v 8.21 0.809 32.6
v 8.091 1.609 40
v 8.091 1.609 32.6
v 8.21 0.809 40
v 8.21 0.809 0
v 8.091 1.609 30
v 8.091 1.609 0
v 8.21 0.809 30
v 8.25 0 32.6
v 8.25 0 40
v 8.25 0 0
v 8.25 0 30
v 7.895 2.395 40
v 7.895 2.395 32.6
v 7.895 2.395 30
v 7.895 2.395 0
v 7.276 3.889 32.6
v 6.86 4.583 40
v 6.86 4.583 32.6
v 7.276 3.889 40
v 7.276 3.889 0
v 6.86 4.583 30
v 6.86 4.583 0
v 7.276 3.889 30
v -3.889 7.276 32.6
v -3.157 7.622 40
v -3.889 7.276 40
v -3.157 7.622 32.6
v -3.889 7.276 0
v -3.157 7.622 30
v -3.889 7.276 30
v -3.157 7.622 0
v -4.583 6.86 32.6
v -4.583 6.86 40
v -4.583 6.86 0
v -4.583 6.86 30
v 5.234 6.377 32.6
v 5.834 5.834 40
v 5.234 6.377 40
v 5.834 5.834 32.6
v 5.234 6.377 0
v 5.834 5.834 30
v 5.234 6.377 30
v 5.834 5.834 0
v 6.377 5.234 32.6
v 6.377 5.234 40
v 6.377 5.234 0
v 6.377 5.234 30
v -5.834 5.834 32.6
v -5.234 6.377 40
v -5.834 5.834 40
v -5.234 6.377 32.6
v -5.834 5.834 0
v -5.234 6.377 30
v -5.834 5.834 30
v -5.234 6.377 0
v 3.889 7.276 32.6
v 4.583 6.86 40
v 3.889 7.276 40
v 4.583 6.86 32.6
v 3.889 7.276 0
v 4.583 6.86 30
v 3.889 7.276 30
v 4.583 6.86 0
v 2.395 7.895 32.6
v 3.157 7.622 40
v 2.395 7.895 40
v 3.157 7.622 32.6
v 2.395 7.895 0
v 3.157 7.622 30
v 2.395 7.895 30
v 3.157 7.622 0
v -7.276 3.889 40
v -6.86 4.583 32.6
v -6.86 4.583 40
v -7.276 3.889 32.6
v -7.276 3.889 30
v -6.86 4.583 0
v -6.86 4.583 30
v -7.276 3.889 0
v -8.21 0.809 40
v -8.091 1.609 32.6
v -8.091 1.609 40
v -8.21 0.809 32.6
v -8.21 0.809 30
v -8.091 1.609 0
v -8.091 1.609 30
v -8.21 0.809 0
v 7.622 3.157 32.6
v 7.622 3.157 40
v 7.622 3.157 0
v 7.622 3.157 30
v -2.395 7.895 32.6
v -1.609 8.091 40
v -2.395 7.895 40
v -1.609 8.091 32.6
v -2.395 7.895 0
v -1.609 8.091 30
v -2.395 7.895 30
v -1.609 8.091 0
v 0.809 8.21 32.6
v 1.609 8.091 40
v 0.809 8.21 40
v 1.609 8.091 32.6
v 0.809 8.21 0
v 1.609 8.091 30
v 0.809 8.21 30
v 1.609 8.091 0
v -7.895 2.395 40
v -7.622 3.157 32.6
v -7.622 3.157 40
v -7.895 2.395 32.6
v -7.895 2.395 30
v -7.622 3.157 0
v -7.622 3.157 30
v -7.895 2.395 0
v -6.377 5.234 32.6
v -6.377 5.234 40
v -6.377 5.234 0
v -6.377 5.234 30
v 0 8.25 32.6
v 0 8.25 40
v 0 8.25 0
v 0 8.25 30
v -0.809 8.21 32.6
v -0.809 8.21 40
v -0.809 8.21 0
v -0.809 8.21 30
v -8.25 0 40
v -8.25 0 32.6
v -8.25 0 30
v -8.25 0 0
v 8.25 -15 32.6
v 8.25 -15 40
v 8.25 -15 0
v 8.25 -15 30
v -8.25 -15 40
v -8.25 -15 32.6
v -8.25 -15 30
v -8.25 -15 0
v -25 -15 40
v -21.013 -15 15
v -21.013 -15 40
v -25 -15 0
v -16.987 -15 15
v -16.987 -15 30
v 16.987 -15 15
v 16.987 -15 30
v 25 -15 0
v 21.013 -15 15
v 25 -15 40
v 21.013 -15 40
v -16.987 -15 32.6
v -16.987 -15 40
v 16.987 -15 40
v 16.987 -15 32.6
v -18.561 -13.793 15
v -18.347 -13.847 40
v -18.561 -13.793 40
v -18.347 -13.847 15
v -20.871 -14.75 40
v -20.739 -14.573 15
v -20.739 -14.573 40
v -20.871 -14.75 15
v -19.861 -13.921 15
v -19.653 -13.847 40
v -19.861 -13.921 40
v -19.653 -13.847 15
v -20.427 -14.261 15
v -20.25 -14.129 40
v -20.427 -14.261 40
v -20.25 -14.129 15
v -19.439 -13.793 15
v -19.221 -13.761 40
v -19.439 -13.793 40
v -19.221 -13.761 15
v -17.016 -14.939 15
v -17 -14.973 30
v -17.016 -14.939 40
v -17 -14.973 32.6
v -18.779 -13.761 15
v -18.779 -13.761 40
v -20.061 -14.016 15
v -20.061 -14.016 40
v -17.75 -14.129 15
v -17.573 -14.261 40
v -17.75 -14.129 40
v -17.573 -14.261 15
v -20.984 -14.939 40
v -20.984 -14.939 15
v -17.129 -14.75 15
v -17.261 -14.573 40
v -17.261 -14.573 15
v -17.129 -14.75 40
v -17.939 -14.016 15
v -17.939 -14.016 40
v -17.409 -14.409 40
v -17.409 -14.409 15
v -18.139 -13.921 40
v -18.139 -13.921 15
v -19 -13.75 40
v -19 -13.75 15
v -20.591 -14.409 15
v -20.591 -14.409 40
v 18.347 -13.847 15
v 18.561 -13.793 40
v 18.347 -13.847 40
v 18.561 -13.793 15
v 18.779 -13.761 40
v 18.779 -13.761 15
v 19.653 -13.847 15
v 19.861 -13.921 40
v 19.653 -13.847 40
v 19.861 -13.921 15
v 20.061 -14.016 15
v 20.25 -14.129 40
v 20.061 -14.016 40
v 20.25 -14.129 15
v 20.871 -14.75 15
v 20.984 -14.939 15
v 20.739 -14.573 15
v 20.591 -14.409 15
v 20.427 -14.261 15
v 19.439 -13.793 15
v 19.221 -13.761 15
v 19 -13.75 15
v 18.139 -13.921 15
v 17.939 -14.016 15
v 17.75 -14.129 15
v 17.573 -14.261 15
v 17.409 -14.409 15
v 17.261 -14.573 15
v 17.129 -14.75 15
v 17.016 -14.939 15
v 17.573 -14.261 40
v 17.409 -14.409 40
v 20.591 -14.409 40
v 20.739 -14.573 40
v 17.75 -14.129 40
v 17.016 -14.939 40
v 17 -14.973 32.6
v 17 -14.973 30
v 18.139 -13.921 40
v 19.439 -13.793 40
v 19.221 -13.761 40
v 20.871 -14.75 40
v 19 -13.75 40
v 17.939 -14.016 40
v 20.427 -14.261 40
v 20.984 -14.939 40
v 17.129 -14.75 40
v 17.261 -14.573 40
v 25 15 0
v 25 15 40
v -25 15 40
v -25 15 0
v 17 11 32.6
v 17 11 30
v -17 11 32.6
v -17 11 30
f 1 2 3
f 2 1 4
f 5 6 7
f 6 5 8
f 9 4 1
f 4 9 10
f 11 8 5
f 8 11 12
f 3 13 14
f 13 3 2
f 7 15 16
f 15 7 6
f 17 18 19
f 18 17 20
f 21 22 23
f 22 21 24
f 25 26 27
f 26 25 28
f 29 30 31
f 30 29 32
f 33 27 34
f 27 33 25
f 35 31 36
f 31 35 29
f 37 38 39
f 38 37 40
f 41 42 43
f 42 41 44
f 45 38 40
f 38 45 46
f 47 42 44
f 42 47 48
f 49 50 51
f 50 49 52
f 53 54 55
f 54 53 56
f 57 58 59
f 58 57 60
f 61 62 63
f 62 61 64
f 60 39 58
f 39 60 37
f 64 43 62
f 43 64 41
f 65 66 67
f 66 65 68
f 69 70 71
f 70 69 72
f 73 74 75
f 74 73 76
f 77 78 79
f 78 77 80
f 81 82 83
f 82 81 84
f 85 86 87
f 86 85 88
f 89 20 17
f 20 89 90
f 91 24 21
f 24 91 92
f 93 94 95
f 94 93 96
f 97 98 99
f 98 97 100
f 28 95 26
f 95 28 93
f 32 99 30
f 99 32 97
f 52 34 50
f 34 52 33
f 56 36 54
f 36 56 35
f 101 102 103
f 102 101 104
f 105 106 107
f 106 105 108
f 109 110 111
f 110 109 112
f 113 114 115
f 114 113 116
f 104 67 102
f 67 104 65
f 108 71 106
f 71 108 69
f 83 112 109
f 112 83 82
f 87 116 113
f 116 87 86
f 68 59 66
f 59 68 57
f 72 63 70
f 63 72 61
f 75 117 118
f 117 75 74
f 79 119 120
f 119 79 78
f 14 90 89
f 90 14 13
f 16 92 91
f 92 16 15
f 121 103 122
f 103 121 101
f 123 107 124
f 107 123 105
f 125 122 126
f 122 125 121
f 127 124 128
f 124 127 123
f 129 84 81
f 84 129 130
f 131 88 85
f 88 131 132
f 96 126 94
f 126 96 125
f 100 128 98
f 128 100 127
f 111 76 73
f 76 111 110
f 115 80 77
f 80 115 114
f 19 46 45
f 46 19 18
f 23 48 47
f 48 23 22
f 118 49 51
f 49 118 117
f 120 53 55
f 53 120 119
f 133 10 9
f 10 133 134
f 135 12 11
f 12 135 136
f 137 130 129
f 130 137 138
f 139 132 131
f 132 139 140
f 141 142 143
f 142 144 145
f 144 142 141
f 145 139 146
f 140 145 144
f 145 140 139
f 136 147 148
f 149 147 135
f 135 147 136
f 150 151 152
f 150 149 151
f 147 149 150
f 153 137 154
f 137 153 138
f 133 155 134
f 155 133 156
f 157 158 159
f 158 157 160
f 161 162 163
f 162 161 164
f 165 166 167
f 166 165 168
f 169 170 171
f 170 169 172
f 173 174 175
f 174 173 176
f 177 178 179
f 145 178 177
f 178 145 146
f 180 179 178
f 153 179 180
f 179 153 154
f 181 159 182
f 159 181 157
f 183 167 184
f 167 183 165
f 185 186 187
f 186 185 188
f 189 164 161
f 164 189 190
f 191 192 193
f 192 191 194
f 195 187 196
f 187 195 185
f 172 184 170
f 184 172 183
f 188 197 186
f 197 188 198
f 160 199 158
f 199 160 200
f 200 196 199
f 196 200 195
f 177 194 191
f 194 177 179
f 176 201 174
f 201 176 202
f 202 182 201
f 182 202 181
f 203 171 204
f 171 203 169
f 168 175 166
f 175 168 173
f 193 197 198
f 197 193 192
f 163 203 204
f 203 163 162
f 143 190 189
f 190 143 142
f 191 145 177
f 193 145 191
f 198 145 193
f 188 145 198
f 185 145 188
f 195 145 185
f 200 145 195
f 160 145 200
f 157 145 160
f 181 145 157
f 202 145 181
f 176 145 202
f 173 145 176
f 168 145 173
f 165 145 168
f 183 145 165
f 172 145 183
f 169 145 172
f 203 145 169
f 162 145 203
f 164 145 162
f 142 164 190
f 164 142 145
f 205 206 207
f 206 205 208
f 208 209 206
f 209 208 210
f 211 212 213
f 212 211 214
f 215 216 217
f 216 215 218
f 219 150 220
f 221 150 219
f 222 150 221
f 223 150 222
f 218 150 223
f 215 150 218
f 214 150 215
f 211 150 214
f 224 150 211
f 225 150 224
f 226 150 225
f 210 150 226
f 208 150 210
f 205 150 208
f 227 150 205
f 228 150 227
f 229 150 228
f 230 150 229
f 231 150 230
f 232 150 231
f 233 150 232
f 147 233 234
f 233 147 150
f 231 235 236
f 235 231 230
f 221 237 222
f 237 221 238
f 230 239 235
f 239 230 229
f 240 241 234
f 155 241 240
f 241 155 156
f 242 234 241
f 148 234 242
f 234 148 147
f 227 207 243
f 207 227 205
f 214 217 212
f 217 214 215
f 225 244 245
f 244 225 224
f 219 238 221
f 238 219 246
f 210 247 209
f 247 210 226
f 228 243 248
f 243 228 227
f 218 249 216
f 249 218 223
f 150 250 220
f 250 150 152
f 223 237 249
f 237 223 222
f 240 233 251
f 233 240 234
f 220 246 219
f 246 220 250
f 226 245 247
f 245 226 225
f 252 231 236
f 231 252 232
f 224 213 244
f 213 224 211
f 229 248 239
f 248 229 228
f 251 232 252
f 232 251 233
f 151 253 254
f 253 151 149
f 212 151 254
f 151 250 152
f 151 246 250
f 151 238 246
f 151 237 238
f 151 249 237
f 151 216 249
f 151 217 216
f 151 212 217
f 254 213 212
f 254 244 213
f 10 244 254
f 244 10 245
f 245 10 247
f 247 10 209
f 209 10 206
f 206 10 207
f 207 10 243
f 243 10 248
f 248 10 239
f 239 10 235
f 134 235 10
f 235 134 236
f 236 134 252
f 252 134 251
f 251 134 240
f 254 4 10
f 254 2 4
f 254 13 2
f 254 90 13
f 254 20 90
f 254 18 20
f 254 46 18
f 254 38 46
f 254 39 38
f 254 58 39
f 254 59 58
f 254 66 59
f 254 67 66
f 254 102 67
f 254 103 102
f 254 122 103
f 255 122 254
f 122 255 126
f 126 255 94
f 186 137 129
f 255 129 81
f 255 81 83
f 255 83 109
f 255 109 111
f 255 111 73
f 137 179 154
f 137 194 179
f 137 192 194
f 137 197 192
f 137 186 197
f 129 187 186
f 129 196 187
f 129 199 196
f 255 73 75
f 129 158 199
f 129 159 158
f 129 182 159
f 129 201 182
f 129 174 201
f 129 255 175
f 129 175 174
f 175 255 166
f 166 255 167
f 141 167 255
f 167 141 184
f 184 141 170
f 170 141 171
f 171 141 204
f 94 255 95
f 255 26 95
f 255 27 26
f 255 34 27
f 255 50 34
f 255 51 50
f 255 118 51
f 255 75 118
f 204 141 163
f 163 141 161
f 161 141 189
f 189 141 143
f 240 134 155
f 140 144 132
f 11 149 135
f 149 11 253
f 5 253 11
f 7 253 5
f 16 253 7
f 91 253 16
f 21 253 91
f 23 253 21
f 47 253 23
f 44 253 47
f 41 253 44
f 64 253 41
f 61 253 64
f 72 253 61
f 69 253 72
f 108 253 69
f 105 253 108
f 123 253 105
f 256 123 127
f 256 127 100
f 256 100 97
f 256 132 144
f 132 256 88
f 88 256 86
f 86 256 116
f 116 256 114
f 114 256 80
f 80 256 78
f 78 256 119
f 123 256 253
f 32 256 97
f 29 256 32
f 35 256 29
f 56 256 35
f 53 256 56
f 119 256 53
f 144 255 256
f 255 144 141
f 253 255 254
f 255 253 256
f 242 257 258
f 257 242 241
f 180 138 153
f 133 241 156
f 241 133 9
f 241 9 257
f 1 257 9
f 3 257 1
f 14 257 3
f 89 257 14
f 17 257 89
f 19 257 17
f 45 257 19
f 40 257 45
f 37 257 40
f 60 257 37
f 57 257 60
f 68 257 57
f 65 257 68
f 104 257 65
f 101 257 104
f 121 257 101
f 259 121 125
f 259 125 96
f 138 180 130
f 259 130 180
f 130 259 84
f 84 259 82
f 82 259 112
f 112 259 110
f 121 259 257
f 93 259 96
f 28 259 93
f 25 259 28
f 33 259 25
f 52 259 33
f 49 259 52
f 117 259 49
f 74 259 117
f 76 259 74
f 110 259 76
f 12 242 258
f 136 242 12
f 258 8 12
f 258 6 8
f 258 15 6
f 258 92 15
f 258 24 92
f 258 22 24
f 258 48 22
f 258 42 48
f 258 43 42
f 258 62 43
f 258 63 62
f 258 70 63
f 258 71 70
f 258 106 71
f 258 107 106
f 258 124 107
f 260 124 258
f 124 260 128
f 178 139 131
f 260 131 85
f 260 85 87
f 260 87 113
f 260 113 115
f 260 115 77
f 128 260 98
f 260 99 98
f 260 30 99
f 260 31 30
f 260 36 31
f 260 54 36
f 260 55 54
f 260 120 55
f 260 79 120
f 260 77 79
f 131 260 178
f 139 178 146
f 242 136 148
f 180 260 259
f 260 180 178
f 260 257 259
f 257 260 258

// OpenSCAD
// Wall-mounted 10 mL syringe holder (tip-down, upright)
// Print orientation: rests on XY plane at z = 0, builds +Z, centred in X/Y.
// Back face (y = 15) is the wall side; syringe slides in from the front (y = -15).

// ---- Block dimensions (measured with calipers) ----
block_w = 50;   // X width
block_d = 30;   // Y depth
block_h = 40;   // Z height

// ---- Barrel channel (16.5 mm wide vertical slot, full height) ----
ch_half_w = 16.5 / 2;   // 8.25 mm half-width
ch_back_r = 8.25;       // radius of the half-circle at the back end
ch_back_cy = 0;         // centre of the back half-circle in Y (y = 0)
ch_front_y = -15;       // straight sides run forward to the front face

// ---- Finger-flange slot (cut in from the front face) ----
flange_w = 34;          // X width, centred
flange_h = 2.6;         // Z thickness (2 mm flange + clearance)
flange_z0 = 30;         // bottom of slot
flange_z1 = 32.6;       // top of slot
flange_y0 = -15;        // starts at the front face
flange_y1 = 11;         // extends back to y = 11

// ---- M4 wall-screw clearance holes (through, along Y) ----
screw_d = 4.5;          // clearance hole diameter
screw_z = 15;           // hole centre height
screw_x = [-19, 19];    // hole centre X positions

// ---- Curvature resolution ----
$fn = 64;

// =====================================================================
// 1. Base block, centred on origin in X and Y, sitting on z = 0
// =====================================================================
module block() { translate([-block_w / 2, -block_d / 2, 0])
    cube([block_w, block_d, block_h]); }

// =====================================================================
// 2. Barrel channel: a full cylinder (back half-circle) unioned with a
//    cube (forward to the front face). Using two simple, valid solids
//    (instead of a degenerate 5-point polygon) makes the union robust,
//    so the difference actually removes the channel.
//    Both pieces extend 1 mm past the top/bottom faces so the cut is
//    clean and no faces end up exactly coplanar with the block.
// =====================================================================
// 2a. Full cylinder at the back (y = 0); the front half is inside the
//     block and the union keeps only the back half-circle.
module channel_back() { translate([0, ch_back_cy, -1])
    cylinder(h = block_h + 2, r = ch_back_r, $fn = 64); }

// 2b. Cube from y = 0 back to the front face (y = -15).
module channel_rect() { translate([-ch_half_w, ch_front_y, -1])
    cube([2 * ch_half_w, -ch_front_y, block_h + 2]); }   // y: -15 .. 0

module barrel_channel() { union() {
    channel_back();
    channel_rect();
} }

// =====================================================================
// 3. Finger-flange slot: 34 mm wide, 2.6 mm tall, y = -15 .. 11
//    (extends 1 mm past the front face so the cut is not coplanar)
// =====================================================================
module flange_slot() { translate([-flange_w / 2, flange_y0 - 1, flange_z0])
    cube([flange_w, flange_y1 - flange_y0 + 1, flange_h]); }

// =====================================================================
// 4. M4 screw clearance holes: 4.5 mm dia, through along Y
//    (extend 1 mm past both the front and back faces)
// =====================================================================
module screw_holes() { for (sx = screw_x)
    translate([sx, -block_d / 2 - 1, screw_z])
        cylinder(h = block_d + 2, r = screw_d / 2, $fn = 64); }

// =====================================================================
// Final part: block minus all cutters
// =====================================================================
difference() {
    block();
    barrel_channel();
    flange_slot();
    screw_holes();
}
